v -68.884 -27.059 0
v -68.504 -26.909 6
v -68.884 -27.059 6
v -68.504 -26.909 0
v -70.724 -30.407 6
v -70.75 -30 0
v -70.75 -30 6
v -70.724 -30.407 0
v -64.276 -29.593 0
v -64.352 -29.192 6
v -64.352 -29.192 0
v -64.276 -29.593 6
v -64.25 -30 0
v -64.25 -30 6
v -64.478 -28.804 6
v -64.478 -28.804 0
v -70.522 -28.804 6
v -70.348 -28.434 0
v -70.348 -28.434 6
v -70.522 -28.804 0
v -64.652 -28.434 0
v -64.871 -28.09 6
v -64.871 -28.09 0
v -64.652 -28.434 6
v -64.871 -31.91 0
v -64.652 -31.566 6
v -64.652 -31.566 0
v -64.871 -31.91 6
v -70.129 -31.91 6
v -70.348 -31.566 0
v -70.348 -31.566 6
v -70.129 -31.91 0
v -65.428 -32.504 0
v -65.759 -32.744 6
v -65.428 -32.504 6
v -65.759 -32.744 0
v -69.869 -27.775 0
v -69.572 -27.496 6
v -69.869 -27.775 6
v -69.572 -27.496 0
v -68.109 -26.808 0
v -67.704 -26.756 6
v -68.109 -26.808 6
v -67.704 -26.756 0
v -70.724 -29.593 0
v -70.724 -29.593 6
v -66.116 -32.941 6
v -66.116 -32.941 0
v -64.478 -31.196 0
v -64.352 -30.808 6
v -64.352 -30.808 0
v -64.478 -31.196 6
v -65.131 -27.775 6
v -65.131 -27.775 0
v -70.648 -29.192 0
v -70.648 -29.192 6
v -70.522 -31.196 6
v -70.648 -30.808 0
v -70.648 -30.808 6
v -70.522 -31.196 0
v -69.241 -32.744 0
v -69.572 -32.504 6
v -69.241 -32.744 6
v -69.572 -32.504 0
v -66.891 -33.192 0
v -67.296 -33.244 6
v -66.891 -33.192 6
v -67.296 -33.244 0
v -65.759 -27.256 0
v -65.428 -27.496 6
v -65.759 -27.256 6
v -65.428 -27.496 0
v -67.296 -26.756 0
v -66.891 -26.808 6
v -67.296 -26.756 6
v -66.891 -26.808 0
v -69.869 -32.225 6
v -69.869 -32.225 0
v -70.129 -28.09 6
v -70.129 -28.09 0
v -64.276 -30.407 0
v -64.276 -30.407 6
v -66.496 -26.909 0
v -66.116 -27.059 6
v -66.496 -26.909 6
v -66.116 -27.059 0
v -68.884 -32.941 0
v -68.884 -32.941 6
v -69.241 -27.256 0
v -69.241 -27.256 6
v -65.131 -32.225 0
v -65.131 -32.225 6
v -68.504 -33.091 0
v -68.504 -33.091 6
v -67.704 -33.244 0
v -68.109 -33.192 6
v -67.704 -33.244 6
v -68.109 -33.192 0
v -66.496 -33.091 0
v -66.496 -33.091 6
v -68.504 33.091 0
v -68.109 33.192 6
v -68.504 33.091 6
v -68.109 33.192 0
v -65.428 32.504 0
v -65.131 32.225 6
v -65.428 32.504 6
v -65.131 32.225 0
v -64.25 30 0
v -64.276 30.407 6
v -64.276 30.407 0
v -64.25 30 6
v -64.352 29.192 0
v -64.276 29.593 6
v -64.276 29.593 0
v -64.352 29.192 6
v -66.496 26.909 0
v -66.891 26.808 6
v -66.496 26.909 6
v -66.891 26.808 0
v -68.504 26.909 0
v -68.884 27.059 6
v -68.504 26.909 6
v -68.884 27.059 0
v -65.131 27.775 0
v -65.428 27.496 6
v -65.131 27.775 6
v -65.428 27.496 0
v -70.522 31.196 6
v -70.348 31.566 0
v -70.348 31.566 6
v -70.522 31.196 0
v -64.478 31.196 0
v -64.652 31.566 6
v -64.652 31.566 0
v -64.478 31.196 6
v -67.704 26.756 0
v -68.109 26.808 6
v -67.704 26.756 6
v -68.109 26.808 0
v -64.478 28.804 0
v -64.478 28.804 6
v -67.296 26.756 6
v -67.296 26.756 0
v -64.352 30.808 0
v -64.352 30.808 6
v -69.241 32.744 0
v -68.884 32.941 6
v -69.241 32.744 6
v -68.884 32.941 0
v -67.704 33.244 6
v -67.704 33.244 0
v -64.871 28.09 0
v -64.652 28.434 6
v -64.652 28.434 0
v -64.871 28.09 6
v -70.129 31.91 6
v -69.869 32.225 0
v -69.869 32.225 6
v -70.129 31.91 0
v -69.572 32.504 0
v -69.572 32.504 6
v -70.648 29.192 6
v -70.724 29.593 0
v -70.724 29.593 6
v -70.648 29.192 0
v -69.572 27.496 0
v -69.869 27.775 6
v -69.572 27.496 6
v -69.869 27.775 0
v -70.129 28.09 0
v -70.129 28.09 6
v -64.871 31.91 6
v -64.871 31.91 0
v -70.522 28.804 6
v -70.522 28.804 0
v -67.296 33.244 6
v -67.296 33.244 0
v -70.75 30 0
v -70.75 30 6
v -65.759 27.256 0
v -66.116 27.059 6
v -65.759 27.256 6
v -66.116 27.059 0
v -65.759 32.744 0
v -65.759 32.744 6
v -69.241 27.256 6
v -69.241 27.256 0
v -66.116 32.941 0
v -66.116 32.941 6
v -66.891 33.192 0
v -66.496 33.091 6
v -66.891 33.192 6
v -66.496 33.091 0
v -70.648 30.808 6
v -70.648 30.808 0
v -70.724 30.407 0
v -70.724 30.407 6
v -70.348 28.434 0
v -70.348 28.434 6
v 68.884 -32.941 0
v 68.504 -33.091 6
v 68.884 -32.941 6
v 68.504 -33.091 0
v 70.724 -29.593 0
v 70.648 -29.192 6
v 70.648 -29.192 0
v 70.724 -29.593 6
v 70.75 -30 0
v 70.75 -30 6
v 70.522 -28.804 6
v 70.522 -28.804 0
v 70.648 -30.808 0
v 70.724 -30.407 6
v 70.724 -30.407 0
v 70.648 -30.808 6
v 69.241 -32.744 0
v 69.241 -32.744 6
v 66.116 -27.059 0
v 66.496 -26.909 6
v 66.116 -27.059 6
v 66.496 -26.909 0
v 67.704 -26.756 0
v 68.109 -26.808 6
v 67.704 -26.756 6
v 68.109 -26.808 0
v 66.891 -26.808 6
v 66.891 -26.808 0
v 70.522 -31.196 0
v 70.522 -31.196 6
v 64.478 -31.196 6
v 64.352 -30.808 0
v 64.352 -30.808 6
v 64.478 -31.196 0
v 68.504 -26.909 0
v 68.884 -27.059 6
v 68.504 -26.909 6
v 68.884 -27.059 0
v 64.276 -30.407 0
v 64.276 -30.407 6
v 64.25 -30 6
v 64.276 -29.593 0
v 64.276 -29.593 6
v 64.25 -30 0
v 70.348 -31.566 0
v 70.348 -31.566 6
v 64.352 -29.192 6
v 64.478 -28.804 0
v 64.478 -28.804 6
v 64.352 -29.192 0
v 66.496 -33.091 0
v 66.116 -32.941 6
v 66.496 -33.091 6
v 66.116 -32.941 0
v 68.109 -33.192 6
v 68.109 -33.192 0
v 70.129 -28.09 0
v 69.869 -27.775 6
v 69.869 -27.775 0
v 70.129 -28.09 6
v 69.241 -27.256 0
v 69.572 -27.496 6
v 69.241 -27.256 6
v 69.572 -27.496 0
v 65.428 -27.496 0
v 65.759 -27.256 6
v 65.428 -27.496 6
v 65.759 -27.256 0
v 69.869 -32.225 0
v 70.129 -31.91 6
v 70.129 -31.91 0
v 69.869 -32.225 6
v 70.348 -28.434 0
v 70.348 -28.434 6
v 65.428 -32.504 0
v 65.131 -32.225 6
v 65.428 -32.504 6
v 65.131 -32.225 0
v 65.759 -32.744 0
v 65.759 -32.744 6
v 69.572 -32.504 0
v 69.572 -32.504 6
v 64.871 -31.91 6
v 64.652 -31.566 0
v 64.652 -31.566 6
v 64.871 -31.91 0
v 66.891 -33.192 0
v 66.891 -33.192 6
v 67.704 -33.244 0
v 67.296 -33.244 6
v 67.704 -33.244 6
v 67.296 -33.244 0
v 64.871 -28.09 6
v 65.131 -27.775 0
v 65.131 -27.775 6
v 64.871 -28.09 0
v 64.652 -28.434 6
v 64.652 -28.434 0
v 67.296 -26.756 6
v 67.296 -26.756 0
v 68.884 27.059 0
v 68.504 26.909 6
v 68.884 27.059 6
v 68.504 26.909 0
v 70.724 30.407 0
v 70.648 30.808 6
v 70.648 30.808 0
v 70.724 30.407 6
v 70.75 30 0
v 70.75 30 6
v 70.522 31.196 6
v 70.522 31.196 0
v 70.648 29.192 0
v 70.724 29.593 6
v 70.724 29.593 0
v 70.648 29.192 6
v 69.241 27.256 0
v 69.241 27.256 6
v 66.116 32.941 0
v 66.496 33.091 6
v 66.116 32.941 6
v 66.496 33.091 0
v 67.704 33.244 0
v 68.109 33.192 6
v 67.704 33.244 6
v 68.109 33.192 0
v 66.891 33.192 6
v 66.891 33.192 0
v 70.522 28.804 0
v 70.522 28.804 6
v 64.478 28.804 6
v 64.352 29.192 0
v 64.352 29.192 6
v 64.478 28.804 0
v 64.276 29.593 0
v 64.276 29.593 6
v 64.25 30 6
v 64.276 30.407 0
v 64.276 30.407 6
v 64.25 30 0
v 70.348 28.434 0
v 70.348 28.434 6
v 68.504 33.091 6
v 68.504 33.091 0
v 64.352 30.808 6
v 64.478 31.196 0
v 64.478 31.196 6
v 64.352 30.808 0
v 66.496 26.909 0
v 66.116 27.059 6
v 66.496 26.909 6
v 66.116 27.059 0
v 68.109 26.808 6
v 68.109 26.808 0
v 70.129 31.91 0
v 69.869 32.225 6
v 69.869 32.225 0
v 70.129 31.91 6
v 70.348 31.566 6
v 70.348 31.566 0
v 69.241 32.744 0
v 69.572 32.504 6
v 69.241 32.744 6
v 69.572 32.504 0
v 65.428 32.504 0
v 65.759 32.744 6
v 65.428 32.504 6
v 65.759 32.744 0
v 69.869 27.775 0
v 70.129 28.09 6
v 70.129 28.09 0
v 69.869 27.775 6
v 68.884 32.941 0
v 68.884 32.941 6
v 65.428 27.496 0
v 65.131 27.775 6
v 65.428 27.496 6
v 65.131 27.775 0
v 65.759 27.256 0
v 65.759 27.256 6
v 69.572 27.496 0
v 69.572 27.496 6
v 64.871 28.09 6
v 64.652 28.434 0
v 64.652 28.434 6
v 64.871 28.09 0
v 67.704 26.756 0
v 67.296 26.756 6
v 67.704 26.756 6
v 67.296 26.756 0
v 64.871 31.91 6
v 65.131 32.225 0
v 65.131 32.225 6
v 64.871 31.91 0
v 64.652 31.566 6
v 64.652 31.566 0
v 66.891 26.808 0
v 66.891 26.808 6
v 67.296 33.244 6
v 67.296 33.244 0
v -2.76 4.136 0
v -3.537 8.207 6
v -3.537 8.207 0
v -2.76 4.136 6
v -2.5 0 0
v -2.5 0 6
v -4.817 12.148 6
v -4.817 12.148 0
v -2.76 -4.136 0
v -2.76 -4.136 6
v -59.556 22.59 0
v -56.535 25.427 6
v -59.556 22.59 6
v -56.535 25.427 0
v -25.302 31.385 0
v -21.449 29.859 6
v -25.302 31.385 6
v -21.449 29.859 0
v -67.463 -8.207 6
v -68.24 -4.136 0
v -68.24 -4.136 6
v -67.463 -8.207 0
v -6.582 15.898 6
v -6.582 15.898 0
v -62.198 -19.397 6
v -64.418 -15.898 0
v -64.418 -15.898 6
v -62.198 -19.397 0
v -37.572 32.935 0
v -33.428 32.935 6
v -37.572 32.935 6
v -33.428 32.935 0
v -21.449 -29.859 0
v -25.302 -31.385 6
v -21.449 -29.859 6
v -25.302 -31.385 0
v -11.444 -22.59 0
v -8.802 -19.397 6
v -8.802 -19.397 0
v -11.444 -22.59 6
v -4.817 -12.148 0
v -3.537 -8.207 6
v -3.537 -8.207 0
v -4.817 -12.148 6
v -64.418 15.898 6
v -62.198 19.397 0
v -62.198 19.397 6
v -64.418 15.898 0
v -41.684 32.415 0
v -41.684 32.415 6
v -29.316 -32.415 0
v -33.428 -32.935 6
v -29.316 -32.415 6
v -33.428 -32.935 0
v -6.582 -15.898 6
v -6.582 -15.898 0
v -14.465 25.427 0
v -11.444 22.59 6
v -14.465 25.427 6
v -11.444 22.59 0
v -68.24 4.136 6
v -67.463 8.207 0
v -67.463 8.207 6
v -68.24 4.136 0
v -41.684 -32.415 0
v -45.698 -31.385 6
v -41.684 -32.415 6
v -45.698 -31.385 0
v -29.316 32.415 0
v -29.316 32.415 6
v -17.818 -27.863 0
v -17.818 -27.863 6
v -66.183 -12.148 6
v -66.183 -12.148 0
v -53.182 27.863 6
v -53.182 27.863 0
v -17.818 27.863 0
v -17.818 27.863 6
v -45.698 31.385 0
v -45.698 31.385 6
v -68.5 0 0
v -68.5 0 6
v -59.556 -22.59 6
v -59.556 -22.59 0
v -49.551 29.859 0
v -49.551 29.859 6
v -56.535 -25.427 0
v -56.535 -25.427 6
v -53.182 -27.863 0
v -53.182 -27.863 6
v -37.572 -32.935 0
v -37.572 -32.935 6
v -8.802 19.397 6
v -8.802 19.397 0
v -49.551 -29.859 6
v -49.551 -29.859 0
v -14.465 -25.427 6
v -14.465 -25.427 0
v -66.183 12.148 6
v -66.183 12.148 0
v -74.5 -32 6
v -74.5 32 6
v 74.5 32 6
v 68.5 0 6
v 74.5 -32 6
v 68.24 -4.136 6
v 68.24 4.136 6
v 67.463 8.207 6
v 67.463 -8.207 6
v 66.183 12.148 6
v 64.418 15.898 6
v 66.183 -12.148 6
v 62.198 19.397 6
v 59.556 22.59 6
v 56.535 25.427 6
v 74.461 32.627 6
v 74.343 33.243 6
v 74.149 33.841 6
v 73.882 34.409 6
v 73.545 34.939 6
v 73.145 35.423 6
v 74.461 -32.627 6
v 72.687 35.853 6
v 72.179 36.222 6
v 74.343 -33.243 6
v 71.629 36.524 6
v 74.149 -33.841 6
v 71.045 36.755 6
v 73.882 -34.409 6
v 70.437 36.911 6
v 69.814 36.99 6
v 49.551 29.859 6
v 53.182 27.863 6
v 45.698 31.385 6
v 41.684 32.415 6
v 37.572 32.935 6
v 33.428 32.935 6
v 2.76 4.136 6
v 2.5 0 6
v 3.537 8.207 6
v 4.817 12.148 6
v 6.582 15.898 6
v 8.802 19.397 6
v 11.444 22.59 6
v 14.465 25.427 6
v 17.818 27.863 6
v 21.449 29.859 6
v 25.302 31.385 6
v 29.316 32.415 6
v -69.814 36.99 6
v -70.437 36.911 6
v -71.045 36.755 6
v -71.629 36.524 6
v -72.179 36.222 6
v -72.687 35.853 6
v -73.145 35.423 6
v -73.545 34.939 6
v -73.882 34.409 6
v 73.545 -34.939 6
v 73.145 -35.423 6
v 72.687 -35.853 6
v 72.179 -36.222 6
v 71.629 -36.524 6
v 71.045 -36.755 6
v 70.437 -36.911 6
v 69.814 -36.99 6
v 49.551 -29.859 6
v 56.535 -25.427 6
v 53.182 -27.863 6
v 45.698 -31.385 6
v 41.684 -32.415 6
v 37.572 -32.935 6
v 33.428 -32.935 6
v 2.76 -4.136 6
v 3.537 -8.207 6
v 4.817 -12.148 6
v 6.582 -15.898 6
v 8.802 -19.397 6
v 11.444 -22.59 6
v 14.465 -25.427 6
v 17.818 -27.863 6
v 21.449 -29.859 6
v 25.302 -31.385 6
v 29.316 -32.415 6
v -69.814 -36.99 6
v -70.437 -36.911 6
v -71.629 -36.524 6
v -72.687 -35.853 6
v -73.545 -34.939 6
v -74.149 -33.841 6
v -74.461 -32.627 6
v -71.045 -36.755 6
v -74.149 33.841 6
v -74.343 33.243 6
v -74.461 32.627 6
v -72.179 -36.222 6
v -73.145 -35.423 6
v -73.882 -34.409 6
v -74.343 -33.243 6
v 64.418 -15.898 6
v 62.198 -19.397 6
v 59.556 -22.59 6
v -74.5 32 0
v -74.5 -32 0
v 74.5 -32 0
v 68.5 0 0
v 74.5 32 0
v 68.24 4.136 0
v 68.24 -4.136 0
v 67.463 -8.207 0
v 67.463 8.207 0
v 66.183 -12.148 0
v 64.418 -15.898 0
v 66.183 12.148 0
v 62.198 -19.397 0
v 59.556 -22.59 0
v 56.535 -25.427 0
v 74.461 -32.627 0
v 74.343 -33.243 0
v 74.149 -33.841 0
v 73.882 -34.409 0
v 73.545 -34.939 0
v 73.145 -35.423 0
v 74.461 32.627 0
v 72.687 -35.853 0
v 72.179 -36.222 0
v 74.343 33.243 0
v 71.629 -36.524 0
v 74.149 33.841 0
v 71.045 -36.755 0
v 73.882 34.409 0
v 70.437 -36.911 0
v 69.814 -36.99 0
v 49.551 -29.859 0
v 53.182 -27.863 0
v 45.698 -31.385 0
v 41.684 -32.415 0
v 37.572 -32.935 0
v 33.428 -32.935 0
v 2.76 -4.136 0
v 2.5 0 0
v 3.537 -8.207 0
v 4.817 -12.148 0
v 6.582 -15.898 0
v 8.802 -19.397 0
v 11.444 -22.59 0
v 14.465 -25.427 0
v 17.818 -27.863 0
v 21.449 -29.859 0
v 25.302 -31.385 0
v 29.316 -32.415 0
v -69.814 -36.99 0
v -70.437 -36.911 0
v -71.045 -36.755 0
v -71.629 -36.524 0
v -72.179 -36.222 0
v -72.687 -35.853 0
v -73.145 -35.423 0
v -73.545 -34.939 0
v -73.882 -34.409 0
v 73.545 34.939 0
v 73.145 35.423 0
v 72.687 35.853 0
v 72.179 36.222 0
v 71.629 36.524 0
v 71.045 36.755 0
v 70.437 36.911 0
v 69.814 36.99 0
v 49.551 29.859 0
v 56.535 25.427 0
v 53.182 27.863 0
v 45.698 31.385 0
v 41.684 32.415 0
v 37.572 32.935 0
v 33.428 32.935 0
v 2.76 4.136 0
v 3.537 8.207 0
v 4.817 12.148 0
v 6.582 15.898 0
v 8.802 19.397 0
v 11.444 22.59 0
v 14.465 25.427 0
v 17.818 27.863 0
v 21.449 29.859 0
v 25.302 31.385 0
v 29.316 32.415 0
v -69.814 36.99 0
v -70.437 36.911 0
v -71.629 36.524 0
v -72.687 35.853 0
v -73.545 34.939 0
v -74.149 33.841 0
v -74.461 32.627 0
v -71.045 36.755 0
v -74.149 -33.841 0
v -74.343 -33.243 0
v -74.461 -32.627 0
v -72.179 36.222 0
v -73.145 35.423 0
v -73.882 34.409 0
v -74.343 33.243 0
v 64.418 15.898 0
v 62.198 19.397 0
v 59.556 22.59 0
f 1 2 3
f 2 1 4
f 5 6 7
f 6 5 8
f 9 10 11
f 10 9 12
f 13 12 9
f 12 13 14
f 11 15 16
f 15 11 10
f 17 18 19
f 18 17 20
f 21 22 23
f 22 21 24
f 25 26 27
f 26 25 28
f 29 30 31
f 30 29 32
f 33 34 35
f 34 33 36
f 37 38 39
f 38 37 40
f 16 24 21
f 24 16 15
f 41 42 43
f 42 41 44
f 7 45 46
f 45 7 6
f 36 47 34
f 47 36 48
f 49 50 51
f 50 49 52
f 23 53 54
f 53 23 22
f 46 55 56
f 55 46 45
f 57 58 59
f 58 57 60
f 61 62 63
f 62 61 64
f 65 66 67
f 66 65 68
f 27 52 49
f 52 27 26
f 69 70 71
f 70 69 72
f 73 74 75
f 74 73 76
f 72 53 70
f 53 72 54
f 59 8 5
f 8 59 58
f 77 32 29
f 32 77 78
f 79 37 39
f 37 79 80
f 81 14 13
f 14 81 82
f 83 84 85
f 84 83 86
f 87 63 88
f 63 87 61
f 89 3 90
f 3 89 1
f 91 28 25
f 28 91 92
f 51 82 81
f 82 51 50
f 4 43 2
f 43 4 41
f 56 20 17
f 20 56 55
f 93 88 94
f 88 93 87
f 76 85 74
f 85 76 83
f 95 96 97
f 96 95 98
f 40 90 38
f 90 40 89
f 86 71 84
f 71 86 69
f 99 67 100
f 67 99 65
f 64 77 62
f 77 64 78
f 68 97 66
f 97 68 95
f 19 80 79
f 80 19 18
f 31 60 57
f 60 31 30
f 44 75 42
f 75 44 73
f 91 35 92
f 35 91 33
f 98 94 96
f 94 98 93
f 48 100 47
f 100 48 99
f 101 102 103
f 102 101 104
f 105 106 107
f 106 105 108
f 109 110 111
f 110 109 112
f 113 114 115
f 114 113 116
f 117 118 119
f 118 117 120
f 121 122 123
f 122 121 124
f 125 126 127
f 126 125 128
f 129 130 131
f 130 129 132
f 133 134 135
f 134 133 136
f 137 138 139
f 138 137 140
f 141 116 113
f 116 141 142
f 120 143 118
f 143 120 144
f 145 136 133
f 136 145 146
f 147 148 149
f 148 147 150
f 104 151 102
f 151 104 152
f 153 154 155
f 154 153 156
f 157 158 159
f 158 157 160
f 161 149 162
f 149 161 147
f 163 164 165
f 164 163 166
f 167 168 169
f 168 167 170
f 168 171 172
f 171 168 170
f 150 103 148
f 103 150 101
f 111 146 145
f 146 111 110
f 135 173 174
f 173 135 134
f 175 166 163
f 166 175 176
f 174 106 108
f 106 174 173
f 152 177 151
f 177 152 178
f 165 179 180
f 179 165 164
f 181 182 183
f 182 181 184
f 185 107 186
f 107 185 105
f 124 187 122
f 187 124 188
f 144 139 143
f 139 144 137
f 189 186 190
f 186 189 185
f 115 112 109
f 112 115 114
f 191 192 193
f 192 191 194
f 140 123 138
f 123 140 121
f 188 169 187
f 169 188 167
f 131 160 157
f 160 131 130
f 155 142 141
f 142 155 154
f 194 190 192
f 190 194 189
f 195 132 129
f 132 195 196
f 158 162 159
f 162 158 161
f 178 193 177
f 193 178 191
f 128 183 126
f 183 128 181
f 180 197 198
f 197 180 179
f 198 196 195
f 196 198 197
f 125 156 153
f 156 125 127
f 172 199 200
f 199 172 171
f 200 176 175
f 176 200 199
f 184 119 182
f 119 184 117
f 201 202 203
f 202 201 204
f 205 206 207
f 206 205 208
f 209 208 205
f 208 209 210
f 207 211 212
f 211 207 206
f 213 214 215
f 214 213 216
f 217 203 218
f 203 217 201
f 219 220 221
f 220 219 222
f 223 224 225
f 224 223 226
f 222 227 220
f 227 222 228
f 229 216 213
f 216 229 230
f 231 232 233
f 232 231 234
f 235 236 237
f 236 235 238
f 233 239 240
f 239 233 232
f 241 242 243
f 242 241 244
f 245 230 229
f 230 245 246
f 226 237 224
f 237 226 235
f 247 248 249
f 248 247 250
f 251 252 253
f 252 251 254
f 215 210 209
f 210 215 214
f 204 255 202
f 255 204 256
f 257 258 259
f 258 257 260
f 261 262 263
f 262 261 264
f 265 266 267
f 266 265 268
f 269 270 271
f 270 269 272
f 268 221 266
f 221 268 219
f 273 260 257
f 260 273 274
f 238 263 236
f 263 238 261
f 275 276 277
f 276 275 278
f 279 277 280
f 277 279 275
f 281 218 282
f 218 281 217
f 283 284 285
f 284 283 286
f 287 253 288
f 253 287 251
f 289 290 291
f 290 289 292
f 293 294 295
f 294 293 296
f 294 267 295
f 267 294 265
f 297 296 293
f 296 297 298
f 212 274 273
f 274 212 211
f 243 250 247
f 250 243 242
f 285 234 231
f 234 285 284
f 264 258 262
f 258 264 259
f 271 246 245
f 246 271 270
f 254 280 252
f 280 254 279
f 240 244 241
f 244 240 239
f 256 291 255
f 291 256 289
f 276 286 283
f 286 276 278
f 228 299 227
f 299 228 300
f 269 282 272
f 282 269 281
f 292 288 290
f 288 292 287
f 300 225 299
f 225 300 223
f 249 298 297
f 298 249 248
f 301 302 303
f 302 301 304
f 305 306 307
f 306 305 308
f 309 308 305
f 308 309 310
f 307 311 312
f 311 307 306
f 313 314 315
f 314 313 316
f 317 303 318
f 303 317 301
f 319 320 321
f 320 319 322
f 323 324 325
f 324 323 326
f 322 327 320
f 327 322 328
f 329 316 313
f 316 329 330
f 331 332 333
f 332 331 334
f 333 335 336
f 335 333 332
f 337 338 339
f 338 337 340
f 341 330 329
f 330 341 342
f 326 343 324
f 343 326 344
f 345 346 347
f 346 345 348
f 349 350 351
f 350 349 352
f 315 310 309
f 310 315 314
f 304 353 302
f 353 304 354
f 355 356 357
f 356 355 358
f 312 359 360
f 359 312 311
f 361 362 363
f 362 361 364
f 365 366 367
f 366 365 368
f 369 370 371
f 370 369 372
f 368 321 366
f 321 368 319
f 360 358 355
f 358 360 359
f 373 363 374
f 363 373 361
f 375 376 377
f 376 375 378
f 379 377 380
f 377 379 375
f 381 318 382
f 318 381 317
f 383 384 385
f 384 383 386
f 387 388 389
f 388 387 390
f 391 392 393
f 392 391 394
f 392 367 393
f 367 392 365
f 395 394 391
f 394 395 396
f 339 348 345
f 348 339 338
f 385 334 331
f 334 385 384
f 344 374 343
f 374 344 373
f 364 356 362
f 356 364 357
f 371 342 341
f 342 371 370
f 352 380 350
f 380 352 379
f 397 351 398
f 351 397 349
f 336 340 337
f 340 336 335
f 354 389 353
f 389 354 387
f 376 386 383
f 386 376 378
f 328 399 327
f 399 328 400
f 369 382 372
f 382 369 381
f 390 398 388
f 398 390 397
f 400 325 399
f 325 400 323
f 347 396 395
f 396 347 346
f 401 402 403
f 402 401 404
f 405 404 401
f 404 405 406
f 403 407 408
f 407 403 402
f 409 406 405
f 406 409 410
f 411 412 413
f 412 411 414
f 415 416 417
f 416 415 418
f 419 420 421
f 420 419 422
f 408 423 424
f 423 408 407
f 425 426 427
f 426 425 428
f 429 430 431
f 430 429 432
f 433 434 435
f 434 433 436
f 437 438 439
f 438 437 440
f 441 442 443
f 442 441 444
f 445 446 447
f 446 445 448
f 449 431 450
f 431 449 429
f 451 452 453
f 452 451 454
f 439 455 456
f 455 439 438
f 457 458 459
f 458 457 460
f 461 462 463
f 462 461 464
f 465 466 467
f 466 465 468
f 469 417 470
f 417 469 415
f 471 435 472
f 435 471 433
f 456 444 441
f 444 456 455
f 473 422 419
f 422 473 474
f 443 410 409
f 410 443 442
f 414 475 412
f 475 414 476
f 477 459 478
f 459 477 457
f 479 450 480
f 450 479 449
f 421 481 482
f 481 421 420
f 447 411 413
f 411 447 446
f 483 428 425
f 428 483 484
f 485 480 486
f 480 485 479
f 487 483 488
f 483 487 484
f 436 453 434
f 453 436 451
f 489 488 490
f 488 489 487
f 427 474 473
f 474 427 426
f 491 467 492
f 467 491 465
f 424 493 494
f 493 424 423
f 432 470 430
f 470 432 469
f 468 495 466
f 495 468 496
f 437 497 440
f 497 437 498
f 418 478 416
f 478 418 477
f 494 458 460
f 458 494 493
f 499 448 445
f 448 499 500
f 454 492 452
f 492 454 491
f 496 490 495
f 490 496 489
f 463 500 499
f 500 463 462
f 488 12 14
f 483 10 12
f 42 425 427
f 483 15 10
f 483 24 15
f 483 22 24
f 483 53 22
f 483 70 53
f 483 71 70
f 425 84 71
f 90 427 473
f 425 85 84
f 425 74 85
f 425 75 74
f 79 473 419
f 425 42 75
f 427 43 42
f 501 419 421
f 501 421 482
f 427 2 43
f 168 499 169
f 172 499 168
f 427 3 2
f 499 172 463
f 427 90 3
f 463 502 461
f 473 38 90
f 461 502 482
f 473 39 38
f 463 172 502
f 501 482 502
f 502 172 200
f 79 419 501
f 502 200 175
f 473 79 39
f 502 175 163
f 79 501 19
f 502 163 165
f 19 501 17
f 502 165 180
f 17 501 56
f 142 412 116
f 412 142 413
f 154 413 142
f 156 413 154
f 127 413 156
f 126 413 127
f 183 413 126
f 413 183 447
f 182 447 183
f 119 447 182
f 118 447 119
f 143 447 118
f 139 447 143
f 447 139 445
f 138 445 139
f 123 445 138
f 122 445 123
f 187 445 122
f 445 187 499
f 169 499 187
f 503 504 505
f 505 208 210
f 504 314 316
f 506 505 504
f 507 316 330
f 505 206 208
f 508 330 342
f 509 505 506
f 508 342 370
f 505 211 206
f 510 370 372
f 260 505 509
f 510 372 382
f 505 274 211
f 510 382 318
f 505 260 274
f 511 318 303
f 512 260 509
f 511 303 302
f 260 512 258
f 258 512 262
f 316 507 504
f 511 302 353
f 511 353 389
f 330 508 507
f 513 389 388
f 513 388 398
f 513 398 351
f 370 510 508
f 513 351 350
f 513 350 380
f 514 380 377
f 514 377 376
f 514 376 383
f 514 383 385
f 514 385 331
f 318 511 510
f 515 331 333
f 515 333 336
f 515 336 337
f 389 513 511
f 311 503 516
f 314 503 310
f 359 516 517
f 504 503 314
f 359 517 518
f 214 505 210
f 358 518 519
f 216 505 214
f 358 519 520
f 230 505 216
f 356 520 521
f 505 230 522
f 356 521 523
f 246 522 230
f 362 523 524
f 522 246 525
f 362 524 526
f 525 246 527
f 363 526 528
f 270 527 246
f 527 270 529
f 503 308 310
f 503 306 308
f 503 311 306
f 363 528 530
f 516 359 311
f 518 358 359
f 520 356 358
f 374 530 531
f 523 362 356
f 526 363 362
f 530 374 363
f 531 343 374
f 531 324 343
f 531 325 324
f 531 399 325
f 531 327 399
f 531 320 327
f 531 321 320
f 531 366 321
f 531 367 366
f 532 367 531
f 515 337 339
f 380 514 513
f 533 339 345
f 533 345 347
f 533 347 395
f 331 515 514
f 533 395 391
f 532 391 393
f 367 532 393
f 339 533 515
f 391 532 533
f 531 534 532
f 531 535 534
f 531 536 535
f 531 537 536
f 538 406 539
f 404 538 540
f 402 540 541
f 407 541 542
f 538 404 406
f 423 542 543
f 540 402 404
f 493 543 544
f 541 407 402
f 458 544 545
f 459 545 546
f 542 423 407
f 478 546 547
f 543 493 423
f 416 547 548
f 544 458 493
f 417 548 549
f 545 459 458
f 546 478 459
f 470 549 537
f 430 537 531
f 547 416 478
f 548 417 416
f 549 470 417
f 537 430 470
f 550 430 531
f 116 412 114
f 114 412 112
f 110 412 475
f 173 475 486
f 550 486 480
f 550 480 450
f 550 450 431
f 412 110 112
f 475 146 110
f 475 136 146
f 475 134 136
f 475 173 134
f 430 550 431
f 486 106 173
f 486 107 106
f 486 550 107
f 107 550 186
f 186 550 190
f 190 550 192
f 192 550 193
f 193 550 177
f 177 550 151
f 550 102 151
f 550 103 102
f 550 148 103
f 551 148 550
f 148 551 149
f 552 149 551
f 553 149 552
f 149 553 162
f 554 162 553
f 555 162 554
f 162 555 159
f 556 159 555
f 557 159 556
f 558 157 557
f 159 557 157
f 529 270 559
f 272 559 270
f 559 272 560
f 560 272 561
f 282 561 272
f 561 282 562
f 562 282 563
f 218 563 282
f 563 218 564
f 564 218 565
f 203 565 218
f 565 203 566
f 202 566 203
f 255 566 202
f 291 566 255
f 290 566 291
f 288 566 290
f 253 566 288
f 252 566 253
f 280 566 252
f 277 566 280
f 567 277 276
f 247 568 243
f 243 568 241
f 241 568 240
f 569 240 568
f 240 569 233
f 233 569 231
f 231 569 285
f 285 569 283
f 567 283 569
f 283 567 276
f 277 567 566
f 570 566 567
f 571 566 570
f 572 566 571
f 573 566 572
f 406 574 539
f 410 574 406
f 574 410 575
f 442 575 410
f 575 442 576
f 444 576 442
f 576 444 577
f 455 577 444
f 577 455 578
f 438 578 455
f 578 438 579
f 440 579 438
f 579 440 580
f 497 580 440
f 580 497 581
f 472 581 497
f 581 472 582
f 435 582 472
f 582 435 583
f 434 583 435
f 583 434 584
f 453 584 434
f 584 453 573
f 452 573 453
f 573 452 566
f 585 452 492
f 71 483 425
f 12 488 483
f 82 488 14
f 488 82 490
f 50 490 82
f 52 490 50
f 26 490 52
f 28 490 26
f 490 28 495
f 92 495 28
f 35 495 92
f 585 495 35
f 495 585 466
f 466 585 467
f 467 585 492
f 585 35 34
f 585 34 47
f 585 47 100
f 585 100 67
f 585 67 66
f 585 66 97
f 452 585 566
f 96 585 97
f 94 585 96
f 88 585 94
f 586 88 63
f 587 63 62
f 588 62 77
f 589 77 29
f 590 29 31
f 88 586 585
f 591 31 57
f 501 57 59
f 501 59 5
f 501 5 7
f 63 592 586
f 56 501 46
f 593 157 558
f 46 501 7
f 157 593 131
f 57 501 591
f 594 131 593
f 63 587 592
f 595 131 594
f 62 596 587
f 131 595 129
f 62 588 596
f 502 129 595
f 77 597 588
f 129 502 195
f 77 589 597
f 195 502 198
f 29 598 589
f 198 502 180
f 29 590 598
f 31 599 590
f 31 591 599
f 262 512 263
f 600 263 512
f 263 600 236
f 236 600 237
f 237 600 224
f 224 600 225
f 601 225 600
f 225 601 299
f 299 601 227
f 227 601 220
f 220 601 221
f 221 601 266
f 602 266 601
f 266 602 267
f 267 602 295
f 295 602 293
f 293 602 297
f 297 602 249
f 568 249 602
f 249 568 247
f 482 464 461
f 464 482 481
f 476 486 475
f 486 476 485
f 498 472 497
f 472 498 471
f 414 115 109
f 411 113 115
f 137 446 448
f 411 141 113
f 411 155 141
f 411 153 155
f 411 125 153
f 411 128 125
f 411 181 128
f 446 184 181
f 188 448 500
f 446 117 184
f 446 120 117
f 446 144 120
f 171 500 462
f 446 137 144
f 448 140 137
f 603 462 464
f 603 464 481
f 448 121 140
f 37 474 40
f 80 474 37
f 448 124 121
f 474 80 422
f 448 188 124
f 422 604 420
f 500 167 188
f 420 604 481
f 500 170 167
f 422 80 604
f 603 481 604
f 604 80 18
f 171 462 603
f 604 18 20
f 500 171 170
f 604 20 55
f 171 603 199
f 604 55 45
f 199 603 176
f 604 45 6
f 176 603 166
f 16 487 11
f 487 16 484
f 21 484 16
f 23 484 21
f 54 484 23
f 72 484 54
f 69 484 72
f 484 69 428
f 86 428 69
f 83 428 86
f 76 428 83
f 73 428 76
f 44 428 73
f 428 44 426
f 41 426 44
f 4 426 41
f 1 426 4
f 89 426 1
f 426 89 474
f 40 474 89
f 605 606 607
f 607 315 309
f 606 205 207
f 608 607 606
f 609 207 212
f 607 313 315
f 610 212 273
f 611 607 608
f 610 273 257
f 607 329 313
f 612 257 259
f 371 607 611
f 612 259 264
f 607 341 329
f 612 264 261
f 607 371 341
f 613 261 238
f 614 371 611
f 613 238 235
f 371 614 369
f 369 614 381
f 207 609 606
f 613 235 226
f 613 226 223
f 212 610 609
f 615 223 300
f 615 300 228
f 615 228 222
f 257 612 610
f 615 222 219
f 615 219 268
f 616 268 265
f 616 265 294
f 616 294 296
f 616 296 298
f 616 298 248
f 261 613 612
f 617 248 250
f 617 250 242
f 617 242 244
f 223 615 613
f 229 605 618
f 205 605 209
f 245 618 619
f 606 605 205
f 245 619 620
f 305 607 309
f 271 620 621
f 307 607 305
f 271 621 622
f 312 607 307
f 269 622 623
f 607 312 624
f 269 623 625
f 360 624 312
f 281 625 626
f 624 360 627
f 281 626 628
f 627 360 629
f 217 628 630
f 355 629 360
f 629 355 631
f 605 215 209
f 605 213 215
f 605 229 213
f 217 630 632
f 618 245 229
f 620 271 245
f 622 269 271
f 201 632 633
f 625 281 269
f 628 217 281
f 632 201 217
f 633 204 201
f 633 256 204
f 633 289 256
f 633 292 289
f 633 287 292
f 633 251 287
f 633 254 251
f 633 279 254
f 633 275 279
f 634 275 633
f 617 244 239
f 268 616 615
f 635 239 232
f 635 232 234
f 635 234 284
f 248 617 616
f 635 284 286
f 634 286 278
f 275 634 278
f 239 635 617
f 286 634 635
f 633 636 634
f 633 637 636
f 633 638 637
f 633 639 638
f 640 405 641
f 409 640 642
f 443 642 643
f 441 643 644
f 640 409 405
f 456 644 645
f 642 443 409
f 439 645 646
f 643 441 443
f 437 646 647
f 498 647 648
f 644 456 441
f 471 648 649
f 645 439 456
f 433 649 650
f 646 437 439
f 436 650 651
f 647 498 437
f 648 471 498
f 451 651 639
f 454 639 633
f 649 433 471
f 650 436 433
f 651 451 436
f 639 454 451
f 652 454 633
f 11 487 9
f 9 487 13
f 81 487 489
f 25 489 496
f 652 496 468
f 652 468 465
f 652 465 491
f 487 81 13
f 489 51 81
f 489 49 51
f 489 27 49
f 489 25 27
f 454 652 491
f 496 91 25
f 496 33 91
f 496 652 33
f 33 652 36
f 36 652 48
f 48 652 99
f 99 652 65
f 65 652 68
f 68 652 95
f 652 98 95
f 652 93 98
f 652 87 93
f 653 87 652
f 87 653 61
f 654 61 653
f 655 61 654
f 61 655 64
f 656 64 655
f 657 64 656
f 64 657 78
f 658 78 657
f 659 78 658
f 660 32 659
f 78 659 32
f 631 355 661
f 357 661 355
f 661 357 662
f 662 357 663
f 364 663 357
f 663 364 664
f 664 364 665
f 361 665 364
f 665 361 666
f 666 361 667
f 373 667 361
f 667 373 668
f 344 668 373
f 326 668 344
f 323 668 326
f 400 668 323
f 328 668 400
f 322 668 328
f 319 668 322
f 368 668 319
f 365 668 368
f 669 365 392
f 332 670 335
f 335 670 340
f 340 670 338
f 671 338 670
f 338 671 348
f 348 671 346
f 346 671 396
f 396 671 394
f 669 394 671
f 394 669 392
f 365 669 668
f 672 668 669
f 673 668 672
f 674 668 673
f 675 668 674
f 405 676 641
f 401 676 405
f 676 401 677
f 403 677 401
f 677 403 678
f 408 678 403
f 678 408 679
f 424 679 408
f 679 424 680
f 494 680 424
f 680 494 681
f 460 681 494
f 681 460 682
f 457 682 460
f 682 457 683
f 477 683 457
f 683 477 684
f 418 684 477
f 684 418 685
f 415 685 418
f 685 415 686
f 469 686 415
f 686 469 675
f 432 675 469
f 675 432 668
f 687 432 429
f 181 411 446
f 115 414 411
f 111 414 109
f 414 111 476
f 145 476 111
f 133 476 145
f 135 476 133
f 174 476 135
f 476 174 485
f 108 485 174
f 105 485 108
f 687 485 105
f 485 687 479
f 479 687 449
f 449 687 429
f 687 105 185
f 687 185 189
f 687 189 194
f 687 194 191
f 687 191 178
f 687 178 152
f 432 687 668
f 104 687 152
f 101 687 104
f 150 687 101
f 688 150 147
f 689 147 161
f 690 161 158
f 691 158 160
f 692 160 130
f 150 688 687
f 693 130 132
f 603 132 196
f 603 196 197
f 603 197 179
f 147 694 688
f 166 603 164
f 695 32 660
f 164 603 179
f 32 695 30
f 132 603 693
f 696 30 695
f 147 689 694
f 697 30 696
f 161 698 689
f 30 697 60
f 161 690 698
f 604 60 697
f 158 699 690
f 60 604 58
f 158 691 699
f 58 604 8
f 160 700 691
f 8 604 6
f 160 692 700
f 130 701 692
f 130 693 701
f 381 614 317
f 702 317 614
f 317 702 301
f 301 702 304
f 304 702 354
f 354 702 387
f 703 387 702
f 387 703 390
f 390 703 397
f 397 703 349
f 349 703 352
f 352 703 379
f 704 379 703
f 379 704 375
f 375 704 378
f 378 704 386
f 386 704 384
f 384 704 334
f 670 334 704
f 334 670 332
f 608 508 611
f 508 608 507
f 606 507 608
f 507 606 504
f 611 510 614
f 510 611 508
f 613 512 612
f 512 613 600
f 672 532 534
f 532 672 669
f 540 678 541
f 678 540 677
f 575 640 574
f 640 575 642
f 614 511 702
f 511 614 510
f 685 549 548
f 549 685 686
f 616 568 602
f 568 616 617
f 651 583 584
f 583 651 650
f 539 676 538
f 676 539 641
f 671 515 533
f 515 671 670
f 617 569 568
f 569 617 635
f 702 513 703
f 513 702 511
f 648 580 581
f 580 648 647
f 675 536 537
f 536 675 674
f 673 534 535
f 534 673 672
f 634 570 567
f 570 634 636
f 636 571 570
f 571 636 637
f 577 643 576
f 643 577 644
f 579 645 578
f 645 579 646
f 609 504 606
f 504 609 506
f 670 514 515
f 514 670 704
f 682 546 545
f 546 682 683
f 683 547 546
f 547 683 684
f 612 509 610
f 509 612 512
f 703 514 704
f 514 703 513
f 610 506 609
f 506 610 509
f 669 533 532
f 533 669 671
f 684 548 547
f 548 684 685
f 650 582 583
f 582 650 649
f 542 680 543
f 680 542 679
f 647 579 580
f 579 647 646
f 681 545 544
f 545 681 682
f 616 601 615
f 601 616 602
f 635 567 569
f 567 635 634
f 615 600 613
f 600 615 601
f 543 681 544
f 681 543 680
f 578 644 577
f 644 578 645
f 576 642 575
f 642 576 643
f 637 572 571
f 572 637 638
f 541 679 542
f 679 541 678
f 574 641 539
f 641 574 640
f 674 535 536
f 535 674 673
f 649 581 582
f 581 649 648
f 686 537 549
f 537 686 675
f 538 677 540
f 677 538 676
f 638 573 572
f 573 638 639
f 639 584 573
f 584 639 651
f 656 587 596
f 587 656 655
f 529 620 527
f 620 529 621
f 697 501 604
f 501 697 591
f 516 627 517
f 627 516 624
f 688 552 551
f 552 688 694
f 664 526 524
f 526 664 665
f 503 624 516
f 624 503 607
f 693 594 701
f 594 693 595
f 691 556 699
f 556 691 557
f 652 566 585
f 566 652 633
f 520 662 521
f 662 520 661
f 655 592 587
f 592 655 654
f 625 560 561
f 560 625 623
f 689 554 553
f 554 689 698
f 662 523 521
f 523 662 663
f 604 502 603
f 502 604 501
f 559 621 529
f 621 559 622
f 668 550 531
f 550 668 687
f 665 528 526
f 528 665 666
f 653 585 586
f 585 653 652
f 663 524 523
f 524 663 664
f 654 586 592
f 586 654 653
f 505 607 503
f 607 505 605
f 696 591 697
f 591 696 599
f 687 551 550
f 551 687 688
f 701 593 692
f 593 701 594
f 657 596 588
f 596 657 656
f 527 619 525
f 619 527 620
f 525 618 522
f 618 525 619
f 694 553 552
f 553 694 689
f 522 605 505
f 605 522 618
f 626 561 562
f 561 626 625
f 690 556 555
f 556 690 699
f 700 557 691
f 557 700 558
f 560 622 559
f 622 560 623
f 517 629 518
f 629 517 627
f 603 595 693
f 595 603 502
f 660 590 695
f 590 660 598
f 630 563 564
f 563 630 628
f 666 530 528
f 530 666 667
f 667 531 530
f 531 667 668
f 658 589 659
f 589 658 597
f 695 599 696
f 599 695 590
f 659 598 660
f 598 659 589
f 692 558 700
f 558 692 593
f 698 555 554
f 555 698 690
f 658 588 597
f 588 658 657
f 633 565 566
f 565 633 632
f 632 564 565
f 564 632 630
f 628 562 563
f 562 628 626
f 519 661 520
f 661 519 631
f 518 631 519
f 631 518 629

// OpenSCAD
$fn = 50;


difference() {
	union() {
		hull() {
			translate(v = [-69.5000000000, 32.0000000000, 0]) {
				cylinder(h = 6, r = 5);
			}
			translate(v = [69.5000000000, 32.0000000000, 0]) {
				cylinder(h = 6, r = 5);
			}
			translate(v = [-69.5000000000, -32.0000000000, 0]) {
				cylinder(h = 6, r = 5);
			}
			translate(v = [69.5000000000, -32.0000000000, 0]) {
				cylinder(h = 6, r = 5);
			}
		}
	}
	union() {
		#translate(v = [-67.5000000000, -30.0000000000, -100.0000000000]) {
			cylinder(h = 200, r = 3.2500000000);
		}
		#translate(v = [-67.5000000000, 30.0000000000, -100.0000000000]) {
			cylinder(h = 200, r = 3.2500000000);
		}
		#translate(v = [67.5000000000, -30.0000000000, -100.0000000000]) {
			cylinder(h = 200, r = 3.2500000000);
		}
		#translate(v = [67.5000000000, 30.0000000000, -100.0000000000]) {
			cylinder(h = 200, r = 3.2500000000);
		}
		#translate(v = [-35.5000000000, 0, 0]) {
			cylinder(h = 6, r = 33.0000000000);
		}
		#translate(v = [35.5000000000, 0, 0]) {
			cylinder(h = 6, r = 33.0000000000);
		}
	}
}
